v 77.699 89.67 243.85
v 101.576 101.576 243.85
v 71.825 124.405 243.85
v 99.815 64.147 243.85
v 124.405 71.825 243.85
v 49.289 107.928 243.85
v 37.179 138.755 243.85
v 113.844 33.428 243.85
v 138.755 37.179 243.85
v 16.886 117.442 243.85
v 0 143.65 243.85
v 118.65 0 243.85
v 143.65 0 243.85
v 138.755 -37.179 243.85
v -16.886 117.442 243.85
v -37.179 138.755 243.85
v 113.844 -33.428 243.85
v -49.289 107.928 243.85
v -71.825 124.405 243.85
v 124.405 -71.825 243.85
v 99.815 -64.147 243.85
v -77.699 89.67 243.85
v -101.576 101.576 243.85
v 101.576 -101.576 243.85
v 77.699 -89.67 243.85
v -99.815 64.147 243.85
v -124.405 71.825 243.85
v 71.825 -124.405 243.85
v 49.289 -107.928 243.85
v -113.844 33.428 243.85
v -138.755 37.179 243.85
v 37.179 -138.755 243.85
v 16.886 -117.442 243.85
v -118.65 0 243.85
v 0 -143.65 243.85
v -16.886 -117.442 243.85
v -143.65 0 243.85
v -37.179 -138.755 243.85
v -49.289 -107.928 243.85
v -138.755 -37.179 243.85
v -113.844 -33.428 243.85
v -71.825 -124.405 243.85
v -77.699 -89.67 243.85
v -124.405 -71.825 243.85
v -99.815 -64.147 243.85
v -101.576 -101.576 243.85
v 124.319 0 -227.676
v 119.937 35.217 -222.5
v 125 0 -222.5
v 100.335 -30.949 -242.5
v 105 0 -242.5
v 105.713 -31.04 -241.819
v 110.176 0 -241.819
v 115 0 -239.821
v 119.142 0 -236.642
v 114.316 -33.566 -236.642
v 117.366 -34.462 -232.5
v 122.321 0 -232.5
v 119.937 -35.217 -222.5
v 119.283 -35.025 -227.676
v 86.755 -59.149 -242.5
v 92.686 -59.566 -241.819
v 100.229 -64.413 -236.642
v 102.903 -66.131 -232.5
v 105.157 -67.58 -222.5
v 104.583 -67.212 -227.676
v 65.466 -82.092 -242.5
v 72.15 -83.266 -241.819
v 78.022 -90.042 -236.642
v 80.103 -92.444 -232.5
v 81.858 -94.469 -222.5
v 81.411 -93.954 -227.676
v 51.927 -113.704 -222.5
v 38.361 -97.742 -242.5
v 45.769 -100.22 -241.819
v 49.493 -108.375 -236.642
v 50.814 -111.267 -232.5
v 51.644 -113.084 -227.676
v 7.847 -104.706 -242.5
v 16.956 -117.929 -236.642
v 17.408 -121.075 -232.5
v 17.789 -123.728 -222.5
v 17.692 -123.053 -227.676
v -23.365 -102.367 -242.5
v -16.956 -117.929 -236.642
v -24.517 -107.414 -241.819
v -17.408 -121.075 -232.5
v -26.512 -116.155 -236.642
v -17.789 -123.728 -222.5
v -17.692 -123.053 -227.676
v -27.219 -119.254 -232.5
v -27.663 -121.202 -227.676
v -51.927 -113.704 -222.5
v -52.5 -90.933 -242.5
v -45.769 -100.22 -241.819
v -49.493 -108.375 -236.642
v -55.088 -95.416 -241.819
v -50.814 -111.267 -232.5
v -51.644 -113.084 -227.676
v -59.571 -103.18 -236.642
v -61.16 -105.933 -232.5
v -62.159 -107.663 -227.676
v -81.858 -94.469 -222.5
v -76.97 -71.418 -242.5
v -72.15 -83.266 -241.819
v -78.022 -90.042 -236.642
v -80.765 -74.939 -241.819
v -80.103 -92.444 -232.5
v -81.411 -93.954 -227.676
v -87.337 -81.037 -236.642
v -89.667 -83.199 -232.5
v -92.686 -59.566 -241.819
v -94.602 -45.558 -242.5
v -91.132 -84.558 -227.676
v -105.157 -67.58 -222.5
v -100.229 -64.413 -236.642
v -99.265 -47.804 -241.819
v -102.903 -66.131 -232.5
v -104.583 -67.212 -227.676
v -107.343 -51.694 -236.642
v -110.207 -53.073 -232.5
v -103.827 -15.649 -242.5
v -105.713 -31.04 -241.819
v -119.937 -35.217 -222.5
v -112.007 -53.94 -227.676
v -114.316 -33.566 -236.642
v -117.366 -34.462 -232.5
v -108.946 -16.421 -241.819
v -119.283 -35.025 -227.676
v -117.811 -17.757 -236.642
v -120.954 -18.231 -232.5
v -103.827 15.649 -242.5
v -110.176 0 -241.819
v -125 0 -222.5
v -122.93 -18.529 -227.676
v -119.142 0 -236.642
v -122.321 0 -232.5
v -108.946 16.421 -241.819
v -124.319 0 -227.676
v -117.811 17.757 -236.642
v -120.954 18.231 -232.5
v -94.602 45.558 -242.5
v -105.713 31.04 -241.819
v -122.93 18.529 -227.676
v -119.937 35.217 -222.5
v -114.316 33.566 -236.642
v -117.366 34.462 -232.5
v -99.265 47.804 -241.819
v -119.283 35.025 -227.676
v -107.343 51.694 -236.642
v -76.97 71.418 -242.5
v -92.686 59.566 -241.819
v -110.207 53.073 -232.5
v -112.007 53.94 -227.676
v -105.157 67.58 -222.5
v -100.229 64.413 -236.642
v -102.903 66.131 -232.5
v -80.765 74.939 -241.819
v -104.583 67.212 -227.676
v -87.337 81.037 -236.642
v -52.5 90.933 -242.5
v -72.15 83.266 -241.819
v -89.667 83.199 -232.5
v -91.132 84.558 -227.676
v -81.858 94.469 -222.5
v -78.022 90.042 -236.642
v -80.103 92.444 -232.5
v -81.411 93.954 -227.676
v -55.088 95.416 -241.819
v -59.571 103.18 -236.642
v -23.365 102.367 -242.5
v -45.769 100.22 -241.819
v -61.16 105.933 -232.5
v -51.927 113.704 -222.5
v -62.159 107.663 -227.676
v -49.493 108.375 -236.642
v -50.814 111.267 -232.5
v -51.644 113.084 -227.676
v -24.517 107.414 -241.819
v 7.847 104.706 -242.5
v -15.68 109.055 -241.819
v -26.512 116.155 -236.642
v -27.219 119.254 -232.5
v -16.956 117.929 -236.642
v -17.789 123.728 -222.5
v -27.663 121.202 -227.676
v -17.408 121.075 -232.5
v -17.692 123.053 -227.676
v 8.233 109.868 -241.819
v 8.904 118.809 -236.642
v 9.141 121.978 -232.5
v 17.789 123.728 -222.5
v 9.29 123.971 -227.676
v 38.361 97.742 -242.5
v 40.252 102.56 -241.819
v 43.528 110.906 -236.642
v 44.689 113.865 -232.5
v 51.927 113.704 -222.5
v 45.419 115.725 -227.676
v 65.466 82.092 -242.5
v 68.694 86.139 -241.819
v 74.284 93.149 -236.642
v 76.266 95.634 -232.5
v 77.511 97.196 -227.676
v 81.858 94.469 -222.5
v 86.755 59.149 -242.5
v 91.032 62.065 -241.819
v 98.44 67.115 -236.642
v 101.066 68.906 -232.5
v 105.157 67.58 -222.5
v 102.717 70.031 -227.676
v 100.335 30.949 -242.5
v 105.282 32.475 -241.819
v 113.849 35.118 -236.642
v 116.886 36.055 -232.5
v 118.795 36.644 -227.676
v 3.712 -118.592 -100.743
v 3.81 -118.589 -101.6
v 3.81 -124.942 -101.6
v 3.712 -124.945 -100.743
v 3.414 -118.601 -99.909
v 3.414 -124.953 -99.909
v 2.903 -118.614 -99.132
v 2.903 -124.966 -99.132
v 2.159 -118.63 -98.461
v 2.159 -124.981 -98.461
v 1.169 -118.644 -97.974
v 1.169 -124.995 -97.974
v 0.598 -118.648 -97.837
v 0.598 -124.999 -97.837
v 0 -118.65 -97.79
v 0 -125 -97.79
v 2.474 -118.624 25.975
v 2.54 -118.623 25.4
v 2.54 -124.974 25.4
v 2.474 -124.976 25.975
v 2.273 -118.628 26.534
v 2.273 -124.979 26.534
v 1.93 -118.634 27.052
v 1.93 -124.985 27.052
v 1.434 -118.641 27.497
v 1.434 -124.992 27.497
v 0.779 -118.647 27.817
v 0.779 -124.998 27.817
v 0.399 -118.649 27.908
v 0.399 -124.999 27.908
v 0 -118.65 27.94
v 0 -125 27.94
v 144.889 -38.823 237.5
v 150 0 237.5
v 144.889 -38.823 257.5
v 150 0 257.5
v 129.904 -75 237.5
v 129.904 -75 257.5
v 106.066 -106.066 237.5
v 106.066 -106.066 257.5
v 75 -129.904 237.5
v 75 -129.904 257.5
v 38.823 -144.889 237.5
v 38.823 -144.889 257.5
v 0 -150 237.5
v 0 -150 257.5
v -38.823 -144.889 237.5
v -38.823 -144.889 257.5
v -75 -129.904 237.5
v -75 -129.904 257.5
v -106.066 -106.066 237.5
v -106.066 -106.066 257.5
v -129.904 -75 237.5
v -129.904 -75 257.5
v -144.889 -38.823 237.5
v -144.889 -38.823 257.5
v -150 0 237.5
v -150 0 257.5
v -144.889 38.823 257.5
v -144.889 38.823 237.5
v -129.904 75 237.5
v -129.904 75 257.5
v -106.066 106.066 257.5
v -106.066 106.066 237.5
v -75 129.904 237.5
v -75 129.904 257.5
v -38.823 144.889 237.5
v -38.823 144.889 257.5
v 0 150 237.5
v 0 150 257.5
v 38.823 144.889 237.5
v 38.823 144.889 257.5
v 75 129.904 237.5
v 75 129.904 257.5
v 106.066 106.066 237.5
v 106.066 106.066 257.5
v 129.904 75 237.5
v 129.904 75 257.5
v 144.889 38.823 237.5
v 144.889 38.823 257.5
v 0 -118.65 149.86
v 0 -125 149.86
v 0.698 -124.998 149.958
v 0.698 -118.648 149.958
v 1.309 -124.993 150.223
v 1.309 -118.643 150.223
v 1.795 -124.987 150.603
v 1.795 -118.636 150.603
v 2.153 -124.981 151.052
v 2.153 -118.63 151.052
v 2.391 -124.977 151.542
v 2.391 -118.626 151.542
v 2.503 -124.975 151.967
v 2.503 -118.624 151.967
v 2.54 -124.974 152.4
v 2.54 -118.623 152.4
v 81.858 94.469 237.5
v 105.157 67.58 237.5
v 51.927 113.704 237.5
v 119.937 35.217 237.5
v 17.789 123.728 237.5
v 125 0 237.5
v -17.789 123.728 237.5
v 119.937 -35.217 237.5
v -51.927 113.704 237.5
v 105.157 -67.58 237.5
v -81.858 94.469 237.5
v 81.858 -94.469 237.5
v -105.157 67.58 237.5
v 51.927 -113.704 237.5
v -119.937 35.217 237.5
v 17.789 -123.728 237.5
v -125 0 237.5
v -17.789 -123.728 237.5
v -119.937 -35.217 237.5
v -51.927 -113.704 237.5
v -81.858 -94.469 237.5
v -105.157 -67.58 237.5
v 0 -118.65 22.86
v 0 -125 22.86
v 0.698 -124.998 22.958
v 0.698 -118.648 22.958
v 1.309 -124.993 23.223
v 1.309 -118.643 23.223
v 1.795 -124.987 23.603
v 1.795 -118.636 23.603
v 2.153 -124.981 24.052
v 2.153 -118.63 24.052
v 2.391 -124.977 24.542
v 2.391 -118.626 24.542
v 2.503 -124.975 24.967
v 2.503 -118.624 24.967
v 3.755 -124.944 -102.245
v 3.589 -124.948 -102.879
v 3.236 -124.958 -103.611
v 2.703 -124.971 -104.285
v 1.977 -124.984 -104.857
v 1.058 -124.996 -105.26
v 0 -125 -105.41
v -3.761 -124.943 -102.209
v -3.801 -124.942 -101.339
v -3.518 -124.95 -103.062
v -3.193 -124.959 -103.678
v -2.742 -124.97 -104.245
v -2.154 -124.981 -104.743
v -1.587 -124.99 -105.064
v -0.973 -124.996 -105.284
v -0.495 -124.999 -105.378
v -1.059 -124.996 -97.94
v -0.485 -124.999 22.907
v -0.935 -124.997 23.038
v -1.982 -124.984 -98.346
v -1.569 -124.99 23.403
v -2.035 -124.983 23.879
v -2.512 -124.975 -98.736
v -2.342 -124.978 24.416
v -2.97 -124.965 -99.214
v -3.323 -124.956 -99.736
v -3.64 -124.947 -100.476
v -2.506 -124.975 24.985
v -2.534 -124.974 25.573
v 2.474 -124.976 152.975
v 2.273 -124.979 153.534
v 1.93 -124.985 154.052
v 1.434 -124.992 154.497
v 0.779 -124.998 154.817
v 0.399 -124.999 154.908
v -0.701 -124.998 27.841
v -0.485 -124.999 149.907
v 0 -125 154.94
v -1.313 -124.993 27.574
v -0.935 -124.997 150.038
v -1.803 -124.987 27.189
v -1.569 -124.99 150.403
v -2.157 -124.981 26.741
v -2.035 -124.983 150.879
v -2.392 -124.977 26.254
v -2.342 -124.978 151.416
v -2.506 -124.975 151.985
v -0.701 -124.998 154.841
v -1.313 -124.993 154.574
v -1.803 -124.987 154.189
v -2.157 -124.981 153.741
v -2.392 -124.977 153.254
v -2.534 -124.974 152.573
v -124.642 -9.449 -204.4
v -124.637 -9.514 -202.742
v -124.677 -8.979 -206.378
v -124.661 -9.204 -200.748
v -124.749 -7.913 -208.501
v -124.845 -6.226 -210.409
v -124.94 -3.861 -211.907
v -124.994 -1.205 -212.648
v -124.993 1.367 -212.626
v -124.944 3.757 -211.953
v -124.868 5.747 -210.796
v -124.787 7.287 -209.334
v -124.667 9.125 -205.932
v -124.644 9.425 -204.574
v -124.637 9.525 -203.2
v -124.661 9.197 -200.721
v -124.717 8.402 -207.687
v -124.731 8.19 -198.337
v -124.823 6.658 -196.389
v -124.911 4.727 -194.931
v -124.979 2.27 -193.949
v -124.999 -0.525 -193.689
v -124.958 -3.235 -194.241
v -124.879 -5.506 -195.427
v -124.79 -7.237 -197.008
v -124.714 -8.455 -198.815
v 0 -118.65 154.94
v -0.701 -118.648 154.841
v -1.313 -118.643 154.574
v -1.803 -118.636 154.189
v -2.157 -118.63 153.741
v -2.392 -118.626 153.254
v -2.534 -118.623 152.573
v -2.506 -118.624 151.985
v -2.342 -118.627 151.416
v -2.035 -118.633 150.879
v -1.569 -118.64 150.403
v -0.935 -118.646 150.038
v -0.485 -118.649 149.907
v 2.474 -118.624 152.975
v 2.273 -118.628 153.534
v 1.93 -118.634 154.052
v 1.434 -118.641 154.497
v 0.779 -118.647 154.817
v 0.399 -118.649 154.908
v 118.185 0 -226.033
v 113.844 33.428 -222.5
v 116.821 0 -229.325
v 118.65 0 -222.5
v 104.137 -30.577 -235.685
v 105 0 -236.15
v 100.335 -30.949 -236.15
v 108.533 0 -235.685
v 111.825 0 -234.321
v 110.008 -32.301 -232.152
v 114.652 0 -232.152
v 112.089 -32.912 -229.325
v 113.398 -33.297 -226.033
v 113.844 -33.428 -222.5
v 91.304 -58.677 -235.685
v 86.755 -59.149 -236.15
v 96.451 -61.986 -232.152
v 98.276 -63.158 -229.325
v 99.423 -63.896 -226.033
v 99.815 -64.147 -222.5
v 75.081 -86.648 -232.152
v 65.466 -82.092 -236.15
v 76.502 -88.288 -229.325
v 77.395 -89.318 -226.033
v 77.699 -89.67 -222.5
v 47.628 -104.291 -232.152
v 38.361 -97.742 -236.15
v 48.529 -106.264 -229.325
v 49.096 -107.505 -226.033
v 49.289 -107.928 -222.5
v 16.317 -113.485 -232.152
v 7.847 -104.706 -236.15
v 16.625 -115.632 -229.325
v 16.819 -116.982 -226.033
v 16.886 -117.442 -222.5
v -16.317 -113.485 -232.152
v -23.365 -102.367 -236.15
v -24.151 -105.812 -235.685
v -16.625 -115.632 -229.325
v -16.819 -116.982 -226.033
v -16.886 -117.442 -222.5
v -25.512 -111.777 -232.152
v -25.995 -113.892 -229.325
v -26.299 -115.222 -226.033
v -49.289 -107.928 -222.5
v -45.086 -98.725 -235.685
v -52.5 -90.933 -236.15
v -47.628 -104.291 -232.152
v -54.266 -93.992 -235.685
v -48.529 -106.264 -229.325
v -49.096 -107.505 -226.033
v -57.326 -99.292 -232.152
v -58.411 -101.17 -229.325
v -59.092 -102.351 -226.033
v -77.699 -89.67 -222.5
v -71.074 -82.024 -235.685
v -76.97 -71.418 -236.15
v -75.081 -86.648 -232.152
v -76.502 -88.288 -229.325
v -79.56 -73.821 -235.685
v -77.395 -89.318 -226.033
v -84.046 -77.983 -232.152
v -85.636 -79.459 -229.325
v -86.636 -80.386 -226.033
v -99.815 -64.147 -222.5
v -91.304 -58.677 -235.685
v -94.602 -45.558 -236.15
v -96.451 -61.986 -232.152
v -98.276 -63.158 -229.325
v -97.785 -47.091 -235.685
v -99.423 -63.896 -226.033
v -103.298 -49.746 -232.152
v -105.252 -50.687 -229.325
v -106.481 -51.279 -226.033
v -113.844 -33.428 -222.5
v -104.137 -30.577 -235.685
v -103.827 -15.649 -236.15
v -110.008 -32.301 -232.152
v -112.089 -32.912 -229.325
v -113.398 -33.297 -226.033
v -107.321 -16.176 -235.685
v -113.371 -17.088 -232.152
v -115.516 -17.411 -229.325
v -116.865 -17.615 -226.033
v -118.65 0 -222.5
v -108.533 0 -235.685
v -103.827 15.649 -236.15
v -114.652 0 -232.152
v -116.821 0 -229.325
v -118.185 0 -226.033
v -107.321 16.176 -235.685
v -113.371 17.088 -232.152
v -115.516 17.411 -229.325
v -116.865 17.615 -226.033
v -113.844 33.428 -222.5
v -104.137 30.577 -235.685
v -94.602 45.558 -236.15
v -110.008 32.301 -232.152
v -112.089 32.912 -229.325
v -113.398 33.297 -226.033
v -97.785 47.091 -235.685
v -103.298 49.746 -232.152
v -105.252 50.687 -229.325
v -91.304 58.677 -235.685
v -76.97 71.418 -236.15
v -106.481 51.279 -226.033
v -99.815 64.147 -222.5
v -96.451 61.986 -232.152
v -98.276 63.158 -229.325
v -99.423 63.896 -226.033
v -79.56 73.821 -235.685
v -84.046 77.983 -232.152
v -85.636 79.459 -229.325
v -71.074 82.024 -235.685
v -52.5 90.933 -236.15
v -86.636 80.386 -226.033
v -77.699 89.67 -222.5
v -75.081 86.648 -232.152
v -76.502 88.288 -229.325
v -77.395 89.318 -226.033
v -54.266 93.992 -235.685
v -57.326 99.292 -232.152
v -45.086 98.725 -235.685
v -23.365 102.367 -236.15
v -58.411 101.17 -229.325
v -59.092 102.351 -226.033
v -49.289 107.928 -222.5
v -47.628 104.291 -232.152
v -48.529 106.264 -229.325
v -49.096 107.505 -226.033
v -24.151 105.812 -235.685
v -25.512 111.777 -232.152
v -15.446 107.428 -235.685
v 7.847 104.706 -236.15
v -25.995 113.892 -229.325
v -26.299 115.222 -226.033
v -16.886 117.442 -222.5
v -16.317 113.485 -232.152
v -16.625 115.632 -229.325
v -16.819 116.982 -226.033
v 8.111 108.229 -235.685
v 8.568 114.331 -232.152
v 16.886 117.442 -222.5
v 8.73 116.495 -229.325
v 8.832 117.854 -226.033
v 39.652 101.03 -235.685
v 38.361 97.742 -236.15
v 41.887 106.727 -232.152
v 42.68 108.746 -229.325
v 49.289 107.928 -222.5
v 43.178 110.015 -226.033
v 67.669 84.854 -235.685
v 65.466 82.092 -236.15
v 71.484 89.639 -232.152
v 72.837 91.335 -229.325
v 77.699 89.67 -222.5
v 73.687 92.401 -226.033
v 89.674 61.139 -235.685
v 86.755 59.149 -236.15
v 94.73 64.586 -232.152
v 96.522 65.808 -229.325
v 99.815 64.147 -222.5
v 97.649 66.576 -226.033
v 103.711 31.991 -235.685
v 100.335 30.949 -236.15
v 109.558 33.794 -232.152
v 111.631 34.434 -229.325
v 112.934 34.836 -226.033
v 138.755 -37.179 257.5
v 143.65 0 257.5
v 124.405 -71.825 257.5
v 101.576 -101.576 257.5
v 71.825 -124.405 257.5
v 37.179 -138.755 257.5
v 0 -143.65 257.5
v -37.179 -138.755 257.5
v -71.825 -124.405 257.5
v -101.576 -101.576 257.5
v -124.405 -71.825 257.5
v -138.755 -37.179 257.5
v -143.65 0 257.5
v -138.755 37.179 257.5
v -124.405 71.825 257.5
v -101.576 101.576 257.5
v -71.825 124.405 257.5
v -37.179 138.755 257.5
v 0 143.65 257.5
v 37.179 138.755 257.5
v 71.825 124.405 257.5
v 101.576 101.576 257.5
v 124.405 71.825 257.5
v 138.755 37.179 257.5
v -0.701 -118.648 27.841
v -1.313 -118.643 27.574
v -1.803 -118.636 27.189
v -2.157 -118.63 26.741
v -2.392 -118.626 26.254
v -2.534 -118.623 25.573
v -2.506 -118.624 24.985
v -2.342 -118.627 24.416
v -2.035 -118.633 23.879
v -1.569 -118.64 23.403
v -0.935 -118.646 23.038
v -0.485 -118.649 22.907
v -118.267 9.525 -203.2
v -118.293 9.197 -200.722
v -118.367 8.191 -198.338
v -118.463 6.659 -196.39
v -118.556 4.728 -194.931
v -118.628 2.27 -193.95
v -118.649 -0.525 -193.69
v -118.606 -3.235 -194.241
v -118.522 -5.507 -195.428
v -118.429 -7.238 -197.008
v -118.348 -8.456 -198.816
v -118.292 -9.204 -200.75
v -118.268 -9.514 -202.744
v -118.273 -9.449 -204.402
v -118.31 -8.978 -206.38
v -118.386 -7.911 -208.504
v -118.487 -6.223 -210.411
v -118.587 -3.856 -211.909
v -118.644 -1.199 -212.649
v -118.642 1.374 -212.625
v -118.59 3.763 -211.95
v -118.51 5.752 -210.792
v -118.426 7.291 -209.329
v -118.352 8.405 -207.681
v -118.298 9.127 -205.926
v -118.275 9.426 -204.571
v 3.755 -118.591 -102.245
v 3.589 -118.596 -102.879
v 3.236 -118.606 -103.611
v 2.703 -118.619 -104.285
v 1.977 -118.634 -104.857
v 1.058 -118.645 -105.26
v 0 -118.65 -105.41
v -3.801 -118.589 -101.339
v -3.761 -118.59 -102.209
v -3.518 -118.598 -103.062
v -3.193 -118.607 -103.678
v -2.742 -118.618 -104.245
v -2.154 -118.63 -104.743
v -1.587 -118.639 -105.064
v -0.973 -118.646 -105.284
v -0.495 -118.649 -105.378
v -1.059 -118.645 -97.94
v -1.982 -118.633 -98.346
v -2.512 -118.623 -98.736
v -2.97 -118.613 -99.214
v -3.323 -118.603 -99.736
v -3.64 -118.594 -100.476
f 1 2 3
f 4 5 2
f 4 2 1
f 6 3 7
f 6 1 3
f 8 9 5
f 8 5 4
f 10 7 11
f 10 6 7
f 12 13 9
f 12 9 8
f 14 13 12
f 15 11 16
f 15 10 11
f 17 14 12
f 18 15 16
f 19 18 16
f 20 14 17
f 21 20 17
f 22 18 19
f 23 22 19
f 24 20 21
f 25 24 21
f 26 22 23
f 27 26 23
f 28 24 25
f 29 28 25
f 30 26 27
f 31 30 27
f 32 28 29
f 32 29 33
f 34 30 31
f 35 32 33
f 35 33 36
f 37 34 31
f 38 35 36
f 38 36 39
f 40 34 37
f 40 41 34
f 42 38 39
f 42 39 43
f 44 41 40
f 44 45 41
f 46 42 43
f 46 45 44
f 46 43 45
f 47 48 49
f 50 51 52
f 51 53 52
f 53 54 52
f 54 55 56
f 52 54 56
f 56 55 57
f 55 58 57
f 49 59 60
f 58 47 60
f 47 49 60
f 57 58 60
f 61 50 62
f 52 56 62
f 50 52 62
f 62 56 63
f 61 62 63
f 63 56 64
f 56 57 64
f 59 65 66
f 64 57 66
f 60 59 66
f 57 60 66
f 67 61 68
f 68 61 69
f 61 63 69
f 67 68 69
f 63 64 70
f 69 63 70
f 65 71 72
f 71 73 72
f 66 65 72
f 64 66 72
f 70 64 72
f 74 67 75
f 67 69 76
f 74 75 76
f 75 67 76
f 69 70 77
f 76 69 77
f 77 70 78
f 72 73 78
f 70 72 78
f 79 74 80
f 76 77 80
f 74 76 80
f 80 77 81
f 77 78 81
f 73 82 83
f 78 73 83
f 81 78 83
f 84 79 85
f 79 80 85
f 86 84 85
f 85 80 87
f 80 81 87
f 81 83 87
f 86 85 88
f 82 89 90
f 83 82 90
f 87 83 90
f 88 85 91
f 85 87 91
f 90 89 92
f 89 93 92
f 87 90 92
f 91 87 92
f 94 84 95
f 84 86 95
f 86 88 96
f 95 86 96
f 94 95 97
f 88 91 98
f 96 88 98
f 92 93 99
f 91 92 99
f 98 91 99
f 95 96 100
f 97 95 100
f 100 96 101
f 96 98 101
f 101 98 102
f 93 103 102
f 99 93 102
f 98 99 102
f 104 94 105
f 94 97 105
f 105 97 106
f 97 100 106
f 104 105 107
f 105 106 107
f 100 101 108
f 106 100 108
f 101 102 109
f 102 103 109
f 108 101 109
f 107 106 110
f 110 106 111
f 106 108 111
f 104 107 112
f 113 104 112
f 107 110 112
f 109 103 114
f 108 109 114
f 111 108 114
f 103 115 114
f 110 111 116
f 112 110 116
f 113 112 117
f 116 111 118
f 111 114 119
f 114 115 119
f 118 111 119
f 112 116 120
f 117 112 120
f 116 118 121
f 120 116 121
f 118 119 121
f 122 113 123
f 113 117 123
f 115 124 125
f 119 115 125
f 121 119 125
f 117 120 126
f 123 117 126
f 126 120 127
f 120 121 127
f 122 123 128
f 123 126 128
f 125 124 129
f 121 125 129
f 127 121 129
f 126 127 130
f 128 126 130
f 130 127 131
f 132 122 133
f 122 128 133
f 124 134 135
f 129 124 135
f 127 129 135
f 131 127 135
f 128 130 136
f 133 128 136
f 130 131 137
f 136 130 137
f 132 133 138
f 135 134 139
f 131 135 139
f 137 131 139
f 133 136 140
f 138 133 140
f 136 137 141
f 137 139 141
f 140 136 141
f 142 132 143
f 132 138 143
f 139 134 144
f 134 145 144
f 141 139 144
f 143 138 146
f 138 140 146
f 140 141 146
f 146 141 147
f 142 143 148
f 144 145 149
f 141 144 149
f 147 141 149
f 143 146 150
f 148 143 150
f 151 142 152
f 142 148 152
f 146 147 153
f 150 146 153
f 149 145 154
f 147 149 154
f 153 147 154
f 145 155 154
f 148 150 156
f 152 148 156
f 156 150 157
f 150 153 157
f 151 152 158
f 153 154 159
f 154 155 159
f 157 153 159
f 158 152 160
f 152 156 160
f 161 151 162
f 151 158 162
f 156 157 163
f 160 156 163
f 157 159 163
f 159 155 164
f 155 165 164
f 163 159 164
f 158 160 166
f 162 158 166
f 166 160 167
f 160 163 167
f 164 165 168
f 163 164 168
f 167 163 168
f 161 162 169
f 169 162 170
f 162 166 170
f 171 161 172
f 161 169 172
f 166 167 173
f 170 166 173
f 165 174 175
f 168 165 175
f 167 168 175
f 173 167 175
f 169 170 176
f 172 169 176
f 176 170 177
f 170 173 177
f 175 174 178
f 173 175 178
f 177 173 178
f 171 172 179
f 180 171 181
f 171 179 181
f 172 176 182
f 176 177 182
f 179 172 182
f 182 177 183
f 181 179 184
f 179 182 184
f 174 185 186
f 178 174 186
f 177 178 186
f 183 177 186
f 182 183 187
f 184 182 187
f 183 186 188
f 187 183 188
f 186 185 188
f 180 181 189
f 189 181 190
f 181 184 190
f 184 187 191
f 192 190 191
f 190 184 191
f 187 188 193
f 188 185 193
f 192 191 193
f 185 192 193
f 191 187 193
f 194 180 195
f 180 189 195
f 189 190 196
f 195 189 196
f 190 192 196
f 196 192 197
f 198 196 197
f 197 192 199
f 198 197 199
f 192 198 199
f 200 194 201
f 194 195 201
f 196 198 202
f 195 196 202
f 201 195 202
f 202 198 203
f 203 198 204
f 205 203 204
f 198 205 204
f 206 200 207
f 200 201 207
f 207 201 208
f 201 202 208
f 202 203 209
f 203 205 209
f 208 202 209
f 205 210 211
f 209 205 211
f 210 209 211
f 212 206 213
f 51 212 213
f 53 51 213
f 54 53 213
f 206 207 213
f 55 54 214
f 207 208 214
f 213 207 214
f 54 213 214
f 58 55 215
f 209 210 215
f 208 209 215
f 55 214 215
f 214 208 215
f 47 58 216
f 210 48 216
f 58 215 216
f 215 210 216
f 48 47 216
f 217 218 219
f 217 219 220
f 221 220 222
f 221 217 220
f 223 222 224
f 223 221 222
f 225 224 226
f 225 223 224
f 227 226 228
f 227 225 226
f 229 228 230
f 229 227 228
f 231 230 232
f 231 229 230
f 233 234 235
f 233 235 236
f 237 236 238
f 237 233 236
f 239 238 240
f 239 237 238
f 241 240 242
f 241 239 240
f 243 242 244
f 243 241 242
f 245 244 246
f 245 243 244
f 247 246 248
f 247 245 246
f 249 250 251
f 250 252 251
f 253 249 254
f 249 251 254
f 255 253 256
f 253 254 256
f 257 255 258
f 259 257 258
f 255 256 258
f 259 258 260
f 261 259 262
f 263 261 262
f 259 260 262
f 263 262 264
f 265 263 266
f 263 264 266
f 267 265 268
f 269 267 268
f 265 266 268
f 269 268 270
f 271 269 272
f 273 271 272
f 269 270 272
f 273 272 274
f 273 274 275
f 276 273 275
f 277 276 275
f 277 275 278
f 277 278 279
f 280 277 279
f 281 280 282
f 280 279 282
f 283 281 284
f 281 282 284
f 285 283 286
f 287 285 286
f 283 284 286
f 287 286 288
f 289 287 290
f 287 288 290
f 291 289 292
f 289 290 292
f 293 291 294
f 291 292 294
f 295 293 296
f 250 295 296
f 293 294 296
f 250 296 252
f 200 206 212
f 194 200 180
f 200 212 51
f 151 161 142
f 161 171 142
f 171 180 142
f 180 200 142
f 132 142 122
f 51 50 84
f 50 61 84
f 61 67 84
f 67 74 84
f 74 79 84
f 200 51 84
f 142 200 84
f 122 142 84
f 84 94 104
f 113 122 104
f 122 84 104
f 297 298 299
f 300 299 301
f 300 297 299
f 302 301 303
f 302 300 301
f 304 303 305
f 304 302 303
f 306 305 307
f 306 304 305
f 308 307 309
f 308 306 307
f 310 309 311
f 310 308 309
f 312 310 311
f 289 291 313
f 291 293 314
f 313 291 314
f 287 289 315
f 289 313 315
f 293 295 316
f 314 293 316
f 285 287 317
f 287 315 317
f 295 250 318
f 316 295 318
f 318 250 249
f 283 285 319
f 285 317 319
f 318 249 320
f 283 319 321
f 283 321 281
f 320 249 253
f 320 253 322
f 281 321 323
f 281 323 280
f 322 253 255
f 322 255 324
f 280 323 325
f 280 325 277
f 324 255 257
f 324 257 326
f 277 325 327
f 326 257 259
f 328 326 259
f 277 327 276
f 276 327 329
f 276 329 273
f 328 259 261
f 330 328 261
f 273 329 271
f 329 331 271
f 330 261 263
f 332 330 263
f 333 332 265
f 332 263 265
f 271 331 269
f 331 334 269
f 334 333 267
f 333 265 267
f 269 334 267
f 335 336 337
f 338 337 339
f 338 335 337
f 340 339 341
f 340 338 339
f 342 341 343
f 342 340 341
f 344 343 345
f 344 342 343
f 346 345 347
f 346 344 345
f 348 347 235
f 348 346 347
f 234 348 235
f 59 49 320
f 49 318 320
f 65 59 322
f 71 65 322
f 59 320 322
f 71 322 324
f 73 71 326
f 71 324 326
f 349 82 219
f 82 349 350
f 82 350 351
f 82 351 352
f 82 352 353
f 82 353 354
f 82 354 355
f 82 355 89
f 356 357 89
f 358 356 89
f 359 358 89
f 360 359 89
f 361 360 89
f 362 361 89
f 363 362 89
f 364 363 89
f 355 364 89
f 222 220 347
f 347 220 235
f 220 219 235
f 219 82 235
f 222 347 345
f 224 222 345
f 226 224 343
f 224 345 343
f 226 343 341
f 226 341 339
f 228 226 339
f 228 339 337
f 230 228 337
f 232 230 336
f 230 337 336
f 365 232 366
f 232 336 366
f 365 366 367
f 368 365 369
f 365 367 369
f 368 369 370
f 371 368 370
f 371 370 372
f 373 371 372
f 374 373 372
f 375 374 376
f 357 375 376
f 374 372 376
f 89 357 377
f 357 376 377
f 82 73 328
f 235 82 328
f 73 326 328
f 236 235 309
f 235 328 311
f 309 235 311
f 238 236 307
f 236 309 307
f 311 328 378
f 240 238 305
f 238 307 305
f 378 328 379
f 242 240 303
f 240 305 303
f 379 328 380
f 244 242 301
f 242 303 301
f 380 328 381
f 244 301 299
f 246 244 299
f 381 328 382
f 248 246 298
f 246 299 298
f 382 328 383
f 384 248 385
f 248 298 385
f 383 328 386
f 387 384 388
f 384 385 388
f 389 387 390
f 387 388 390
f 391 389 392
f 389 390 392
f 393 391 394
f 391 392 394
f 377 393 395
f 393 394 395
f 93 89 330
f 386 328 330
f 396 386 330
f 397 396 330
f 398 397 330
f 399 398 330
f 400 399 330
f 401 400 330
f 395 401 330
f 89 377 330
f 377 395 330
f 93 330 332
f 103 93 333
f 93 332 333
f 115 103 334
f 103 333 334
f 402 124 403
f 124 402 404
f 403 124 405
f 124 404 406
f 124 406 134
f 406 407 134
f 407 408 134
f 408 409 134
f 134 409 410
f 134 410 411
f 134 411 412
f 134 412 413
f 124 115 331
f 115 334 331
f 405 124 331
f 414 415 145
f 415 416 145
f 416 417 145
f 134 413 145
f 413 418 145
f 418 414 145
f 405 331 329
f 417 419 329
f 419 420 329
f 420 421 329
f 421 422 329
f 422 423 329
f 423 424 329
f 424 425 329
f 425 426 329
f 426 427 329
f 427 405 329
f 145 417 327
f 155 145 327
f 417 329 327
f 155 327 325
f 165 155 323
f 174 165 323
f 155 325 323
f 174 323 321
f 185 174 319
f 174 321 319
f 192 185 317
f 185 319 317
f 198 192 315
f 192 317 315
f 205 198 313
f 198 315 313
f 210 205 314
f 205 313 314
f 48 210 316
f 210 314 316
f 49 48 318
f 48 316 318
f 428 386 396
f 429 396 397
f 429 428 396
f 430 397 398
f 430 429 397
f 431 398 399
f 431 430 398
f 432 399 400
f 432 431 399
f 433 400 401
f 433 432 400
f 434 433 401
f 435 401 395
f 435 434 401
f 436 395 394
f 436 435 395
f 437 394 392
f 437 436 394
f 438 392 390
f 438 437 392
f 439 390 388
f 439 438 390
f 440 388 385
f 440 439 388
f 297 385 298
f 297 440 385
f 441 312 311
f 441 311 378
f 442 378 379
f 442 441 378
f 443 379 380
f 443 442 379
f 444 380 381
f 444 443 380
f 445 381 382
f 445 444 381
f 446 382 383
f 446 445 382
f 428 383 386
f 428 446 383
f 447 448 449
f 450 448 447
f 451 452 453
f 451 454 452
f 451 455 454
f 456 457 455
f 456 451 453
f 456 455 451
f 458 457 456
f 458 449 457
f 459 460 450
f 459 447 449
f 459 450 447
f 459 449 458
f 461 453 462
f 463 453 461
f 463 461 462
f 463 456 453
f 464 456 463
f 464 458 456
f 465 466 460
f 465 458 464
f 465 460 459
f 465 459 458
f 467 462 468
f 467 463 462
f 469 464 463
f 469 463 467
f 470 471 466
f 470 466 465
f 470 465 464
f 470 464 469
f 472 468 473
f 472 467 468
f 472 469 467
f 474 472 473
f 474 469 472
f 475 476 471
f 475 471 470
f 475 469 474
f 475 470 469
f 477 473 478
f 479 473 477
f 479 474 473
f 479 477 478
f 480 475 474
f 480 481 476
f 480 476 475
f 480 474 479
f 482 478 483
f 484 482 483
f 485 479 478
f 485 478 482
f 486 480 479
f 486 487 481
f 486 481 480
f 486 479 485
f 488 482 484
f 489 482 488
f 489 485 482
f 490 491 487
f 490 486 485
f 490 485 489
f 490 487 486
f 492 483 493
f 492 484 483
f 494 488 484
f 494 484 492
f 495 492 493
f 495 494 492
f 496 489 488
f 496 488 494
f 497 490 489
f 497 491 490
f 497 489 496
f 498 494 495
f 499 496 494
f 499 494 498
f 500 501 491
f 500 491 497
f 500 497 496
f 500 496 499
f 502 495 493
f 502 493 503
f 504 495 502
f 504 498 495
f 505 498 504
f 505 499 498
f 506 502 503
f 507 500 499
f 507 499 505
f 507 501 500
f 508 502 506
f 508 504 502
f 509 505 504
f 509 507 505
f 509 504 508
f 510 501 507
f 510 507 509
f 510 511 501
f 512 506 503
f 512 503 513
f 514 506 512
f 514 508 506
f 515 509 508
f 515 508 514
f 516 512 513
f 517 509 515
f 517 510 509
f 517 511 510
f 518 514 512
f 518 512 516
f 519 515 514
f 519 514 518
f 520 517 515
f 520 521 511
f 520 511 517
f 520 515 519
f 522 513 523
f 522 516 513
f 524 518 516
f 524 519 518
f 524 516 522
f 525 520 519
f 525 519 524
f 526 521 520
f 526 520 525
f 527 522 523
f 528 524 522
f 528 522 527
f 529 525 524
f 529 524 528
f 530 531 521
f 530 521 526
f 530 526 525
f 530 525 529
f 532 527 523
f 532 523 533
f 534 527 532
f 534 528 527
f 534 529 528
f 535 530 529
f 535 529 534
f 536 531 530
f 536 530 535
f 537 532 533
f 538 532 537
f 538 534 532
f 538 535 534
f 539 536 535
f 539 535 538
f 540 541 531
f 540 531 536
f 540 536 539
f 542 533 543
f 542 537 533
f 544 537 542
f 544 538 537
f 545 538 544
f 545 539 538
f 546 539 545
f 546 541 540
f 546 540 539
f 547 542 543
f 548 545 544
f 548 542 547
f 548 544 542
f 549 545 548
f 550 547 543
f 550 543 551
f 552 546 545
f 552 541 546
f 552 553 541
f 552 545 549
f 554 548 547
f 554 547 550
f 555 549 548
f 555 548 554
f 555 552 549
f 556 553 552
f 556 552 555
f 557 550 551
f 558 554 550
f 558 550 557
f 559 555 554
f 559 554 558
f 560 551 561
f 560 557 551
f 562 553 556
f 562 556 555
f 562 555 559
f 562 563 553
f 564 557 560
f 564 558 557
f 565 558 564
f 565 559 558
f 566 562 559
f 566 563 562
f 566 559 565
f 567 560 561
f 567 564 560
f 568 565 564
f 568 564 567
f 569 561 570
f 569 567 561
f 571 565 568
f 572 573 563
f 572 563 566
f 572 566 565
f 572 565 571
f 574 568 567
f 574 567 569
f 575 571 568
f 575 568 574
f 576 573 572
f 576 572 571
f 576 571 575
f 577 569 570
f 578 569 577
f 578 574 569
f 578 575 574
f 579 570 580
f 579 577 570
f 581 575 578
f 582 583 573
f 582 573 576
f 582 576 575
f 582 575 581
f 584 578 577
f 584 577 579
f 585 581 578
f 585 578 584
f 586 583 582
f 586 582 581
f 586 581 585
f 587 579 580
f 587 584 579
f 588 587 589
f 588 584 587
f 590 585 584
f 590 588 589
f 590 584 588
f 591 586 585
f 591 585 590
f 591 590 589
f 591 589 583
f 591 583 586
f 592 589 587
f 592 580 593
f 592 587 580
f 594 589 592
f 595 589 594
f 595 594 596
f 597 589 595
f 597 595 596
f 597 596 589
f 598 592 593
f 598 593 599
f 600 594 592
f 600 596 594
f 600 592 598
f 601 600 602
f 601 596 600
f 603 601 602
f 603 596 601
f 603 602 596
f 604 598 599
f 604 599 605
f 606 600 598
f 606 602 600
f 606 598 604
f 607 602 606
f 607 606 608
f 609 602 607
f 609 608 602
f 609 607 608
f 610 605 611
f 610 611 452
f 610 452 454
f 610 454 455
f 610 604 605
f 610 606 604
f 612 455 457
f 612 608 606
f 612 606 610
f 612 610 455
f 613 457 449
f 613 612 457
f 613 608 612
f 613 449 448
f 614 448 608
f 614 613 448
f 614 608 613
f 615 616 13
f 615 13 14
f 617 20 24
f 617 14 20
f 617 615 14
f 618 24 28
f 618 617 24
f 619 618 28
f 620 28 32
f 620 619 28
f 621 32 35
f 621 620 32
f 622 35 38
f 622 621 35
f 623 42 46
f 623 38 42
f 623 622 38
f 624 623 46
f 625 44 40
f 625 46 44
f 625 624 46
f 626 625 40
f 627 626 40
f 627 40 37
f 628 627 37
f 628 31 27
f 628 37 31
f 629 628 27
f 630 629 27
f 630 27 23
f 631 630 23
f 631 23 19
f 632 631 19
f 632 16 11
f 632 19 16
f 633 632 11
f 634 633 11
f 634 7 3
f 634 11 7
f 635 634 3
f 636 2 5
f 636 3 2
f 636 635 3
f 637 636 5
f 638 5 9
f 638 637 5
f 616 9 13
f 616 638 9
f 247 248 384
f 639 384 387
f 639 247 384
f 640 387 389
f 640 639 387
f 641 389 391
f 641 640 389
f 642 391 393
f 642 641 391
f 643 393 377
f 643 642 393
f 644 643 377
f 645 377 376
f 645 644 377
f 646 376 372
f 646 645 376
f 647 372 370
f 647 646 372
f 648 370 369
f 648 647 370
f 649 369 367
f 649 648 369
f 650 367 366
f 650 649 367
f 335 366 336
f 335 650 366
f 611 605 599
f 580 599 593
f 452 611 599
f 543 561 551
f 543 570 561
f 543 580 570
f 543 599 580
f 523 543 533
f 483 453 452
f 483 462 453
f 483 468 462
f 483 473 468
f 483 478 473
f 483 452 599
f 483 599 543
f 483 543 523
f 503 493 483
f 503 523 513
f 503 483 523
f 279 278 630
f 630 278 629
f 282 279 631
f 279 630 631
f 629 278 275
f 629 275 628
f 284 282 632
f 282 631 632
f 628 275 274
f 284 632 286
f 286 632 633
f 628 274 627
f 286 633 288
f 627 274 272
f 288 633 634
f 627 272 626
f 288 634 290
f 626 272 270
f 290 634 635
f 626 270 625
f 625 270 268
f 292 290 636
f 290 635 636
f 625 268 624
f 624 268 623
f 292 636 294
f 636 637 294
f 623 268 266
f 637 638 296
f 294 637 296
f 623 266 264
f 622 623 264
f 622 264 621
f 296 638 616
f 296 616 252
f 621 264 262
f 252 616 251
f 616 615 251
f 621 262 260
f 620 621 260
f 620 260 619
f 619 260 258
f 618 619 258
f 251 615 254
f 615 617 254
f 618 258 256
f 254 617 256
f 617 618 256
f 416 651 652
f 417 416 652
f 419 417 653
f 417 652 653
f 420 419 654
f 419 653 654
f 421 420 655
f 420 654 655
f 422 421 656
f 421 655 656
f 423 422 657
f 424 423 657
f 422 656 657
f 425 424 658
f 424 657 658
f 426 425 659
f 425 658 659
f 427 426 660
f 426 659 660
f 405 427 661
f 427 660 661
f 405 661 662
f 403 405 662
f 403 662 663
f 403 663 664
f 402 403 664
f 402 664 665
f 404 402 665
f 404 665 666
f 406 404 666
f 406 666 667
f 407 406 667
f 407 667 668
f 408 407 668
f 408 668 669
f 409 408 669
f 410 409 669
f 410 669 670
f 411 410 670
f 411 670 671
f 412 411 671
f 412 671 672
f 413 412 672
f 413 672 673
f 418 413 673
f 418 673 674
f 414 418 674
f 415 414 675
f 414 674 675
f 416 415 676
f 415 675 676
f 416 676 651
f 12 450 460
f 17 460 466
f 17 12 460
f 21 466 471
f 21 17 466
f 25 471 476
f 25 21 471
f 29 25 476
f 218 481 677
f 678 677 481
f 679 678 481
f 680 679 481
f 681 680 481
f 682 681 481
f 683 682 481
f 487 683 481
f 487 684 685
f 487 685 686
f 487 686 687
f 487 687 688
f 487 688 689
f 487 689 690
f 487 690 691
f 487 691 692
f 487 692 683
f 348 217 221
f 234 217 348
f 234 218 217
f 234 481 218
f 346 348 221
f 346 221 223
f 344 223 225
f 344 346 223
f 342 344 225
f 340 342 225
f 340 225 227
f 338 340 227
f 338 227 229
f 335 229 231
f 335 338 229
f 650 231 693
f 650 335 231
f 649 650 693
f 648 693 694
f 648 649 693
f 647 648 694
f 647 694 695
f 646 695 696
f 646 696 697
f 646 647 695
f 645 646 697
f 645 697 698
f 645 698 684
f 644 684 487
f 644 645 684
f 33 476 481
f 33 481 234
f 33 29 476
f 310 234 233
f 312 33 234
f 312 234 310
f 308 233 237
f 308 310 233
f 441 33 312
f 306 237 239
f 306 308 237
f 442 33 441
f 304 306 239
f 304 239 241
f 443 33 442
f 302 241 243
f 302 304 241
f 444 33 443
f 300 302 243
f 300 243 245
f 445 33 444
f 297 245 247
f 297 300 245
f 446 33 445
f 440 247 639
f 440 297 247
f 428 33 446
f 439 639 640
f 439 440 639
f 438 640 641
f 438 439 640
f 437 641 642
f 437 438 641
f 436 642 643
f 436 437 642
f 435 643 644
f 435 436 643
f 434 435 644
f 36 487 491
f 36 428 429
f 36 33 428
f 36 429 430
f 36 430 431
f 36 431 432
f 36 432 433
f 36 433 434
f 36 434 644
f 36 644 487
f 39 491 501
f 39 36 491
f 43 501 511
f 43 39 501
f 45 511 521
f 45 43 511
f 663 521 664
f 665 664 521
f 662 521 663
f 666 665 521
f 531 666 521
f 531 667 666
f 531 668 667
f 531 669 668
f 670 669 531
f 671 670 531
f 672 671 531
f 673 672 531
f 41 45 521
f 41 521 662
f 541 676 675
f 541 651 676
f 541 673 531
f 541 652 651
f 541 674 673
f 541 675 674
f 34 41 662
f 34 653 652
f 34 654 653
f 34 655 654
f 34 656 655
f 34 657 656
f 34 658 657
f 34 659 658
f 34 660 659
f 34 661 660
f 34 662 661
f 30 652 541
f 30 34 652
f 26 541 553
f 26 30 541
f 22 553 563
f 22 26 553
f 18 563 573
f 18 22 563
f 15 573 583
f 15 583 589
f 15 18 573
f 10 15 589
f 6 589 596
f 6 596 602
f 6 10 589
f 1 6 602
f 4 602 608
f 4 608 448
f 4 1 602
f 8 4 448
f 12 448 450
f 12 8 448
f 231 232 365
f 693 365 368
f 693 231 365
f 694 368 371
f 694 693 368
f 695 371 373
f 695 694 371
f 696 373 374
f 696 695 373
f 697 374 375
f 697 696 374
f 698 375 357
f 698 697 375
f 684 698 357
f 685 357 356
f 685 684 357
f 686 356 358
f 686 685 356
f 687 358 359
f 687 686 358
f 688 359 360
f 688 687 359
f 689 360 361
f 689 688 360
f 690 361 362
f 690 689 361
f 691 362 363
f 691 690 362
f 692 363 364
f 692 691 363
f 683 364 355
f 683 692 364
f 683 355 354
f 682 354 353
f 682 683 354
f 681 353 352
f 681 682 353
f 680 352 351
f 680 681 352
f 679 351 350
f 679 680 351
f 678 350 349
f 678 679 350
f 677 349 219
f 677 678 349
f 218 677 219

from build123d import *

# Parameters (mm, degrees)
F2_T     = -6.35
F4_DEPTH = 150.001
F6_DEPTH = 150.001


with BuildPart() as f1:
    # F0 (on Front) → F1 (revolve)
    with BuildSketch(Plane.XZ):
        with BuildLine():
            Line((0, 257.5), (0, -242.5))
            Line((0, -242.5), (105, -242.5))
            ThreePointArc((105, -242.5), (119.1421356237, -236.6421356237), (125, -222.5))
            Line((125, -222.5), (125, 237.5))
            Line((125, 237.5), (150, 237.5))
            Line((150, 237.5), (150, 257.5))
            Line((150, 257.5), (0, 257.5))
        make_face()
    revolve(axis=Axis((0, 0, 7.5), (0, 0, -1)))

    # F2
    f2_openings = [f1.faces().sort_by_distance(p)[0] for p in [
        (0, 0, 257.5),
    ]]
    offset(amount=F2_T, openings=f2_openings, kind=Kind.INTERSECTION)

    # F3 (on Front) → F4 (cut, through all)
    with BuildSketch(Plane.XZ):
        with BuildLine():
            ThreePointArc((0, 149.86), (1.7960512242, 150.6039487758), (2.54, 152.4))
            ThreePointArc((2.54, 152.4), (1.7960512242, 154.1960512242), (0, 154.94))
            Line((0, 154.94), (0, 149.86))
        make_face()
        with BuildLine():
            ThreePointArc((3.81, -101.6), (2.6940768363, -98.9059231637), (0, -97.79))
            Line((0, -97.79), (0, -105.41))
            ThreePointArc((0, -105.41), (2.6940768363, -104.2940768363), (3.81, -101.6))
        make_face()
        with BuildLine():
            Line((0, -105.41), (0, -97.79))
            ThreePointArc((0, -97.79), (-3.81, -101.6), (0, -105.41))
        make_face()
        with BuildLine():
            ThreePointArc((2.54, 25.4), (1.7960512242, 27.1960512242), (0, 27.94))
            Line((0, 27.94), (0, 22.86))
            ThreePointArc((0, 22.86), (1.7960512242, 23.6039487758), (2.54, 25.4))
        make_face()
        with BuildLine():
            Line((0, 22.86), (0, 27.94))
            ThreePointArc((0, 27.94), (-2.54, 25.4), (0, 22.86))
        make_face()
        with BuildLine():
            Line((0, 149.86), (0, 154.94))
            ThreePointArc((0, 154.94), (-2.54, 152.4), (0, 149.86))
        make_face()
    extrude(amount=F4_DEPTH, mode=Mode.SUBTRACT)

    # F5 (on Right) → F6 (cut, through all)
    with BuildSketch(Plane.YZ):
        with BuildLine():
            ThreePointArc((0, -193.675), (-6.7351920908, -209.9351920908), (9.525, -203.2))
            ThreePointArc((9.525, -203.2), (6.7351920908, -196.4648079092), (0, -193.675))
        make_face()
    extrude(amount=-F6_DEPTH, mode=Mode.SUBTRACT)


solid = f1.part
